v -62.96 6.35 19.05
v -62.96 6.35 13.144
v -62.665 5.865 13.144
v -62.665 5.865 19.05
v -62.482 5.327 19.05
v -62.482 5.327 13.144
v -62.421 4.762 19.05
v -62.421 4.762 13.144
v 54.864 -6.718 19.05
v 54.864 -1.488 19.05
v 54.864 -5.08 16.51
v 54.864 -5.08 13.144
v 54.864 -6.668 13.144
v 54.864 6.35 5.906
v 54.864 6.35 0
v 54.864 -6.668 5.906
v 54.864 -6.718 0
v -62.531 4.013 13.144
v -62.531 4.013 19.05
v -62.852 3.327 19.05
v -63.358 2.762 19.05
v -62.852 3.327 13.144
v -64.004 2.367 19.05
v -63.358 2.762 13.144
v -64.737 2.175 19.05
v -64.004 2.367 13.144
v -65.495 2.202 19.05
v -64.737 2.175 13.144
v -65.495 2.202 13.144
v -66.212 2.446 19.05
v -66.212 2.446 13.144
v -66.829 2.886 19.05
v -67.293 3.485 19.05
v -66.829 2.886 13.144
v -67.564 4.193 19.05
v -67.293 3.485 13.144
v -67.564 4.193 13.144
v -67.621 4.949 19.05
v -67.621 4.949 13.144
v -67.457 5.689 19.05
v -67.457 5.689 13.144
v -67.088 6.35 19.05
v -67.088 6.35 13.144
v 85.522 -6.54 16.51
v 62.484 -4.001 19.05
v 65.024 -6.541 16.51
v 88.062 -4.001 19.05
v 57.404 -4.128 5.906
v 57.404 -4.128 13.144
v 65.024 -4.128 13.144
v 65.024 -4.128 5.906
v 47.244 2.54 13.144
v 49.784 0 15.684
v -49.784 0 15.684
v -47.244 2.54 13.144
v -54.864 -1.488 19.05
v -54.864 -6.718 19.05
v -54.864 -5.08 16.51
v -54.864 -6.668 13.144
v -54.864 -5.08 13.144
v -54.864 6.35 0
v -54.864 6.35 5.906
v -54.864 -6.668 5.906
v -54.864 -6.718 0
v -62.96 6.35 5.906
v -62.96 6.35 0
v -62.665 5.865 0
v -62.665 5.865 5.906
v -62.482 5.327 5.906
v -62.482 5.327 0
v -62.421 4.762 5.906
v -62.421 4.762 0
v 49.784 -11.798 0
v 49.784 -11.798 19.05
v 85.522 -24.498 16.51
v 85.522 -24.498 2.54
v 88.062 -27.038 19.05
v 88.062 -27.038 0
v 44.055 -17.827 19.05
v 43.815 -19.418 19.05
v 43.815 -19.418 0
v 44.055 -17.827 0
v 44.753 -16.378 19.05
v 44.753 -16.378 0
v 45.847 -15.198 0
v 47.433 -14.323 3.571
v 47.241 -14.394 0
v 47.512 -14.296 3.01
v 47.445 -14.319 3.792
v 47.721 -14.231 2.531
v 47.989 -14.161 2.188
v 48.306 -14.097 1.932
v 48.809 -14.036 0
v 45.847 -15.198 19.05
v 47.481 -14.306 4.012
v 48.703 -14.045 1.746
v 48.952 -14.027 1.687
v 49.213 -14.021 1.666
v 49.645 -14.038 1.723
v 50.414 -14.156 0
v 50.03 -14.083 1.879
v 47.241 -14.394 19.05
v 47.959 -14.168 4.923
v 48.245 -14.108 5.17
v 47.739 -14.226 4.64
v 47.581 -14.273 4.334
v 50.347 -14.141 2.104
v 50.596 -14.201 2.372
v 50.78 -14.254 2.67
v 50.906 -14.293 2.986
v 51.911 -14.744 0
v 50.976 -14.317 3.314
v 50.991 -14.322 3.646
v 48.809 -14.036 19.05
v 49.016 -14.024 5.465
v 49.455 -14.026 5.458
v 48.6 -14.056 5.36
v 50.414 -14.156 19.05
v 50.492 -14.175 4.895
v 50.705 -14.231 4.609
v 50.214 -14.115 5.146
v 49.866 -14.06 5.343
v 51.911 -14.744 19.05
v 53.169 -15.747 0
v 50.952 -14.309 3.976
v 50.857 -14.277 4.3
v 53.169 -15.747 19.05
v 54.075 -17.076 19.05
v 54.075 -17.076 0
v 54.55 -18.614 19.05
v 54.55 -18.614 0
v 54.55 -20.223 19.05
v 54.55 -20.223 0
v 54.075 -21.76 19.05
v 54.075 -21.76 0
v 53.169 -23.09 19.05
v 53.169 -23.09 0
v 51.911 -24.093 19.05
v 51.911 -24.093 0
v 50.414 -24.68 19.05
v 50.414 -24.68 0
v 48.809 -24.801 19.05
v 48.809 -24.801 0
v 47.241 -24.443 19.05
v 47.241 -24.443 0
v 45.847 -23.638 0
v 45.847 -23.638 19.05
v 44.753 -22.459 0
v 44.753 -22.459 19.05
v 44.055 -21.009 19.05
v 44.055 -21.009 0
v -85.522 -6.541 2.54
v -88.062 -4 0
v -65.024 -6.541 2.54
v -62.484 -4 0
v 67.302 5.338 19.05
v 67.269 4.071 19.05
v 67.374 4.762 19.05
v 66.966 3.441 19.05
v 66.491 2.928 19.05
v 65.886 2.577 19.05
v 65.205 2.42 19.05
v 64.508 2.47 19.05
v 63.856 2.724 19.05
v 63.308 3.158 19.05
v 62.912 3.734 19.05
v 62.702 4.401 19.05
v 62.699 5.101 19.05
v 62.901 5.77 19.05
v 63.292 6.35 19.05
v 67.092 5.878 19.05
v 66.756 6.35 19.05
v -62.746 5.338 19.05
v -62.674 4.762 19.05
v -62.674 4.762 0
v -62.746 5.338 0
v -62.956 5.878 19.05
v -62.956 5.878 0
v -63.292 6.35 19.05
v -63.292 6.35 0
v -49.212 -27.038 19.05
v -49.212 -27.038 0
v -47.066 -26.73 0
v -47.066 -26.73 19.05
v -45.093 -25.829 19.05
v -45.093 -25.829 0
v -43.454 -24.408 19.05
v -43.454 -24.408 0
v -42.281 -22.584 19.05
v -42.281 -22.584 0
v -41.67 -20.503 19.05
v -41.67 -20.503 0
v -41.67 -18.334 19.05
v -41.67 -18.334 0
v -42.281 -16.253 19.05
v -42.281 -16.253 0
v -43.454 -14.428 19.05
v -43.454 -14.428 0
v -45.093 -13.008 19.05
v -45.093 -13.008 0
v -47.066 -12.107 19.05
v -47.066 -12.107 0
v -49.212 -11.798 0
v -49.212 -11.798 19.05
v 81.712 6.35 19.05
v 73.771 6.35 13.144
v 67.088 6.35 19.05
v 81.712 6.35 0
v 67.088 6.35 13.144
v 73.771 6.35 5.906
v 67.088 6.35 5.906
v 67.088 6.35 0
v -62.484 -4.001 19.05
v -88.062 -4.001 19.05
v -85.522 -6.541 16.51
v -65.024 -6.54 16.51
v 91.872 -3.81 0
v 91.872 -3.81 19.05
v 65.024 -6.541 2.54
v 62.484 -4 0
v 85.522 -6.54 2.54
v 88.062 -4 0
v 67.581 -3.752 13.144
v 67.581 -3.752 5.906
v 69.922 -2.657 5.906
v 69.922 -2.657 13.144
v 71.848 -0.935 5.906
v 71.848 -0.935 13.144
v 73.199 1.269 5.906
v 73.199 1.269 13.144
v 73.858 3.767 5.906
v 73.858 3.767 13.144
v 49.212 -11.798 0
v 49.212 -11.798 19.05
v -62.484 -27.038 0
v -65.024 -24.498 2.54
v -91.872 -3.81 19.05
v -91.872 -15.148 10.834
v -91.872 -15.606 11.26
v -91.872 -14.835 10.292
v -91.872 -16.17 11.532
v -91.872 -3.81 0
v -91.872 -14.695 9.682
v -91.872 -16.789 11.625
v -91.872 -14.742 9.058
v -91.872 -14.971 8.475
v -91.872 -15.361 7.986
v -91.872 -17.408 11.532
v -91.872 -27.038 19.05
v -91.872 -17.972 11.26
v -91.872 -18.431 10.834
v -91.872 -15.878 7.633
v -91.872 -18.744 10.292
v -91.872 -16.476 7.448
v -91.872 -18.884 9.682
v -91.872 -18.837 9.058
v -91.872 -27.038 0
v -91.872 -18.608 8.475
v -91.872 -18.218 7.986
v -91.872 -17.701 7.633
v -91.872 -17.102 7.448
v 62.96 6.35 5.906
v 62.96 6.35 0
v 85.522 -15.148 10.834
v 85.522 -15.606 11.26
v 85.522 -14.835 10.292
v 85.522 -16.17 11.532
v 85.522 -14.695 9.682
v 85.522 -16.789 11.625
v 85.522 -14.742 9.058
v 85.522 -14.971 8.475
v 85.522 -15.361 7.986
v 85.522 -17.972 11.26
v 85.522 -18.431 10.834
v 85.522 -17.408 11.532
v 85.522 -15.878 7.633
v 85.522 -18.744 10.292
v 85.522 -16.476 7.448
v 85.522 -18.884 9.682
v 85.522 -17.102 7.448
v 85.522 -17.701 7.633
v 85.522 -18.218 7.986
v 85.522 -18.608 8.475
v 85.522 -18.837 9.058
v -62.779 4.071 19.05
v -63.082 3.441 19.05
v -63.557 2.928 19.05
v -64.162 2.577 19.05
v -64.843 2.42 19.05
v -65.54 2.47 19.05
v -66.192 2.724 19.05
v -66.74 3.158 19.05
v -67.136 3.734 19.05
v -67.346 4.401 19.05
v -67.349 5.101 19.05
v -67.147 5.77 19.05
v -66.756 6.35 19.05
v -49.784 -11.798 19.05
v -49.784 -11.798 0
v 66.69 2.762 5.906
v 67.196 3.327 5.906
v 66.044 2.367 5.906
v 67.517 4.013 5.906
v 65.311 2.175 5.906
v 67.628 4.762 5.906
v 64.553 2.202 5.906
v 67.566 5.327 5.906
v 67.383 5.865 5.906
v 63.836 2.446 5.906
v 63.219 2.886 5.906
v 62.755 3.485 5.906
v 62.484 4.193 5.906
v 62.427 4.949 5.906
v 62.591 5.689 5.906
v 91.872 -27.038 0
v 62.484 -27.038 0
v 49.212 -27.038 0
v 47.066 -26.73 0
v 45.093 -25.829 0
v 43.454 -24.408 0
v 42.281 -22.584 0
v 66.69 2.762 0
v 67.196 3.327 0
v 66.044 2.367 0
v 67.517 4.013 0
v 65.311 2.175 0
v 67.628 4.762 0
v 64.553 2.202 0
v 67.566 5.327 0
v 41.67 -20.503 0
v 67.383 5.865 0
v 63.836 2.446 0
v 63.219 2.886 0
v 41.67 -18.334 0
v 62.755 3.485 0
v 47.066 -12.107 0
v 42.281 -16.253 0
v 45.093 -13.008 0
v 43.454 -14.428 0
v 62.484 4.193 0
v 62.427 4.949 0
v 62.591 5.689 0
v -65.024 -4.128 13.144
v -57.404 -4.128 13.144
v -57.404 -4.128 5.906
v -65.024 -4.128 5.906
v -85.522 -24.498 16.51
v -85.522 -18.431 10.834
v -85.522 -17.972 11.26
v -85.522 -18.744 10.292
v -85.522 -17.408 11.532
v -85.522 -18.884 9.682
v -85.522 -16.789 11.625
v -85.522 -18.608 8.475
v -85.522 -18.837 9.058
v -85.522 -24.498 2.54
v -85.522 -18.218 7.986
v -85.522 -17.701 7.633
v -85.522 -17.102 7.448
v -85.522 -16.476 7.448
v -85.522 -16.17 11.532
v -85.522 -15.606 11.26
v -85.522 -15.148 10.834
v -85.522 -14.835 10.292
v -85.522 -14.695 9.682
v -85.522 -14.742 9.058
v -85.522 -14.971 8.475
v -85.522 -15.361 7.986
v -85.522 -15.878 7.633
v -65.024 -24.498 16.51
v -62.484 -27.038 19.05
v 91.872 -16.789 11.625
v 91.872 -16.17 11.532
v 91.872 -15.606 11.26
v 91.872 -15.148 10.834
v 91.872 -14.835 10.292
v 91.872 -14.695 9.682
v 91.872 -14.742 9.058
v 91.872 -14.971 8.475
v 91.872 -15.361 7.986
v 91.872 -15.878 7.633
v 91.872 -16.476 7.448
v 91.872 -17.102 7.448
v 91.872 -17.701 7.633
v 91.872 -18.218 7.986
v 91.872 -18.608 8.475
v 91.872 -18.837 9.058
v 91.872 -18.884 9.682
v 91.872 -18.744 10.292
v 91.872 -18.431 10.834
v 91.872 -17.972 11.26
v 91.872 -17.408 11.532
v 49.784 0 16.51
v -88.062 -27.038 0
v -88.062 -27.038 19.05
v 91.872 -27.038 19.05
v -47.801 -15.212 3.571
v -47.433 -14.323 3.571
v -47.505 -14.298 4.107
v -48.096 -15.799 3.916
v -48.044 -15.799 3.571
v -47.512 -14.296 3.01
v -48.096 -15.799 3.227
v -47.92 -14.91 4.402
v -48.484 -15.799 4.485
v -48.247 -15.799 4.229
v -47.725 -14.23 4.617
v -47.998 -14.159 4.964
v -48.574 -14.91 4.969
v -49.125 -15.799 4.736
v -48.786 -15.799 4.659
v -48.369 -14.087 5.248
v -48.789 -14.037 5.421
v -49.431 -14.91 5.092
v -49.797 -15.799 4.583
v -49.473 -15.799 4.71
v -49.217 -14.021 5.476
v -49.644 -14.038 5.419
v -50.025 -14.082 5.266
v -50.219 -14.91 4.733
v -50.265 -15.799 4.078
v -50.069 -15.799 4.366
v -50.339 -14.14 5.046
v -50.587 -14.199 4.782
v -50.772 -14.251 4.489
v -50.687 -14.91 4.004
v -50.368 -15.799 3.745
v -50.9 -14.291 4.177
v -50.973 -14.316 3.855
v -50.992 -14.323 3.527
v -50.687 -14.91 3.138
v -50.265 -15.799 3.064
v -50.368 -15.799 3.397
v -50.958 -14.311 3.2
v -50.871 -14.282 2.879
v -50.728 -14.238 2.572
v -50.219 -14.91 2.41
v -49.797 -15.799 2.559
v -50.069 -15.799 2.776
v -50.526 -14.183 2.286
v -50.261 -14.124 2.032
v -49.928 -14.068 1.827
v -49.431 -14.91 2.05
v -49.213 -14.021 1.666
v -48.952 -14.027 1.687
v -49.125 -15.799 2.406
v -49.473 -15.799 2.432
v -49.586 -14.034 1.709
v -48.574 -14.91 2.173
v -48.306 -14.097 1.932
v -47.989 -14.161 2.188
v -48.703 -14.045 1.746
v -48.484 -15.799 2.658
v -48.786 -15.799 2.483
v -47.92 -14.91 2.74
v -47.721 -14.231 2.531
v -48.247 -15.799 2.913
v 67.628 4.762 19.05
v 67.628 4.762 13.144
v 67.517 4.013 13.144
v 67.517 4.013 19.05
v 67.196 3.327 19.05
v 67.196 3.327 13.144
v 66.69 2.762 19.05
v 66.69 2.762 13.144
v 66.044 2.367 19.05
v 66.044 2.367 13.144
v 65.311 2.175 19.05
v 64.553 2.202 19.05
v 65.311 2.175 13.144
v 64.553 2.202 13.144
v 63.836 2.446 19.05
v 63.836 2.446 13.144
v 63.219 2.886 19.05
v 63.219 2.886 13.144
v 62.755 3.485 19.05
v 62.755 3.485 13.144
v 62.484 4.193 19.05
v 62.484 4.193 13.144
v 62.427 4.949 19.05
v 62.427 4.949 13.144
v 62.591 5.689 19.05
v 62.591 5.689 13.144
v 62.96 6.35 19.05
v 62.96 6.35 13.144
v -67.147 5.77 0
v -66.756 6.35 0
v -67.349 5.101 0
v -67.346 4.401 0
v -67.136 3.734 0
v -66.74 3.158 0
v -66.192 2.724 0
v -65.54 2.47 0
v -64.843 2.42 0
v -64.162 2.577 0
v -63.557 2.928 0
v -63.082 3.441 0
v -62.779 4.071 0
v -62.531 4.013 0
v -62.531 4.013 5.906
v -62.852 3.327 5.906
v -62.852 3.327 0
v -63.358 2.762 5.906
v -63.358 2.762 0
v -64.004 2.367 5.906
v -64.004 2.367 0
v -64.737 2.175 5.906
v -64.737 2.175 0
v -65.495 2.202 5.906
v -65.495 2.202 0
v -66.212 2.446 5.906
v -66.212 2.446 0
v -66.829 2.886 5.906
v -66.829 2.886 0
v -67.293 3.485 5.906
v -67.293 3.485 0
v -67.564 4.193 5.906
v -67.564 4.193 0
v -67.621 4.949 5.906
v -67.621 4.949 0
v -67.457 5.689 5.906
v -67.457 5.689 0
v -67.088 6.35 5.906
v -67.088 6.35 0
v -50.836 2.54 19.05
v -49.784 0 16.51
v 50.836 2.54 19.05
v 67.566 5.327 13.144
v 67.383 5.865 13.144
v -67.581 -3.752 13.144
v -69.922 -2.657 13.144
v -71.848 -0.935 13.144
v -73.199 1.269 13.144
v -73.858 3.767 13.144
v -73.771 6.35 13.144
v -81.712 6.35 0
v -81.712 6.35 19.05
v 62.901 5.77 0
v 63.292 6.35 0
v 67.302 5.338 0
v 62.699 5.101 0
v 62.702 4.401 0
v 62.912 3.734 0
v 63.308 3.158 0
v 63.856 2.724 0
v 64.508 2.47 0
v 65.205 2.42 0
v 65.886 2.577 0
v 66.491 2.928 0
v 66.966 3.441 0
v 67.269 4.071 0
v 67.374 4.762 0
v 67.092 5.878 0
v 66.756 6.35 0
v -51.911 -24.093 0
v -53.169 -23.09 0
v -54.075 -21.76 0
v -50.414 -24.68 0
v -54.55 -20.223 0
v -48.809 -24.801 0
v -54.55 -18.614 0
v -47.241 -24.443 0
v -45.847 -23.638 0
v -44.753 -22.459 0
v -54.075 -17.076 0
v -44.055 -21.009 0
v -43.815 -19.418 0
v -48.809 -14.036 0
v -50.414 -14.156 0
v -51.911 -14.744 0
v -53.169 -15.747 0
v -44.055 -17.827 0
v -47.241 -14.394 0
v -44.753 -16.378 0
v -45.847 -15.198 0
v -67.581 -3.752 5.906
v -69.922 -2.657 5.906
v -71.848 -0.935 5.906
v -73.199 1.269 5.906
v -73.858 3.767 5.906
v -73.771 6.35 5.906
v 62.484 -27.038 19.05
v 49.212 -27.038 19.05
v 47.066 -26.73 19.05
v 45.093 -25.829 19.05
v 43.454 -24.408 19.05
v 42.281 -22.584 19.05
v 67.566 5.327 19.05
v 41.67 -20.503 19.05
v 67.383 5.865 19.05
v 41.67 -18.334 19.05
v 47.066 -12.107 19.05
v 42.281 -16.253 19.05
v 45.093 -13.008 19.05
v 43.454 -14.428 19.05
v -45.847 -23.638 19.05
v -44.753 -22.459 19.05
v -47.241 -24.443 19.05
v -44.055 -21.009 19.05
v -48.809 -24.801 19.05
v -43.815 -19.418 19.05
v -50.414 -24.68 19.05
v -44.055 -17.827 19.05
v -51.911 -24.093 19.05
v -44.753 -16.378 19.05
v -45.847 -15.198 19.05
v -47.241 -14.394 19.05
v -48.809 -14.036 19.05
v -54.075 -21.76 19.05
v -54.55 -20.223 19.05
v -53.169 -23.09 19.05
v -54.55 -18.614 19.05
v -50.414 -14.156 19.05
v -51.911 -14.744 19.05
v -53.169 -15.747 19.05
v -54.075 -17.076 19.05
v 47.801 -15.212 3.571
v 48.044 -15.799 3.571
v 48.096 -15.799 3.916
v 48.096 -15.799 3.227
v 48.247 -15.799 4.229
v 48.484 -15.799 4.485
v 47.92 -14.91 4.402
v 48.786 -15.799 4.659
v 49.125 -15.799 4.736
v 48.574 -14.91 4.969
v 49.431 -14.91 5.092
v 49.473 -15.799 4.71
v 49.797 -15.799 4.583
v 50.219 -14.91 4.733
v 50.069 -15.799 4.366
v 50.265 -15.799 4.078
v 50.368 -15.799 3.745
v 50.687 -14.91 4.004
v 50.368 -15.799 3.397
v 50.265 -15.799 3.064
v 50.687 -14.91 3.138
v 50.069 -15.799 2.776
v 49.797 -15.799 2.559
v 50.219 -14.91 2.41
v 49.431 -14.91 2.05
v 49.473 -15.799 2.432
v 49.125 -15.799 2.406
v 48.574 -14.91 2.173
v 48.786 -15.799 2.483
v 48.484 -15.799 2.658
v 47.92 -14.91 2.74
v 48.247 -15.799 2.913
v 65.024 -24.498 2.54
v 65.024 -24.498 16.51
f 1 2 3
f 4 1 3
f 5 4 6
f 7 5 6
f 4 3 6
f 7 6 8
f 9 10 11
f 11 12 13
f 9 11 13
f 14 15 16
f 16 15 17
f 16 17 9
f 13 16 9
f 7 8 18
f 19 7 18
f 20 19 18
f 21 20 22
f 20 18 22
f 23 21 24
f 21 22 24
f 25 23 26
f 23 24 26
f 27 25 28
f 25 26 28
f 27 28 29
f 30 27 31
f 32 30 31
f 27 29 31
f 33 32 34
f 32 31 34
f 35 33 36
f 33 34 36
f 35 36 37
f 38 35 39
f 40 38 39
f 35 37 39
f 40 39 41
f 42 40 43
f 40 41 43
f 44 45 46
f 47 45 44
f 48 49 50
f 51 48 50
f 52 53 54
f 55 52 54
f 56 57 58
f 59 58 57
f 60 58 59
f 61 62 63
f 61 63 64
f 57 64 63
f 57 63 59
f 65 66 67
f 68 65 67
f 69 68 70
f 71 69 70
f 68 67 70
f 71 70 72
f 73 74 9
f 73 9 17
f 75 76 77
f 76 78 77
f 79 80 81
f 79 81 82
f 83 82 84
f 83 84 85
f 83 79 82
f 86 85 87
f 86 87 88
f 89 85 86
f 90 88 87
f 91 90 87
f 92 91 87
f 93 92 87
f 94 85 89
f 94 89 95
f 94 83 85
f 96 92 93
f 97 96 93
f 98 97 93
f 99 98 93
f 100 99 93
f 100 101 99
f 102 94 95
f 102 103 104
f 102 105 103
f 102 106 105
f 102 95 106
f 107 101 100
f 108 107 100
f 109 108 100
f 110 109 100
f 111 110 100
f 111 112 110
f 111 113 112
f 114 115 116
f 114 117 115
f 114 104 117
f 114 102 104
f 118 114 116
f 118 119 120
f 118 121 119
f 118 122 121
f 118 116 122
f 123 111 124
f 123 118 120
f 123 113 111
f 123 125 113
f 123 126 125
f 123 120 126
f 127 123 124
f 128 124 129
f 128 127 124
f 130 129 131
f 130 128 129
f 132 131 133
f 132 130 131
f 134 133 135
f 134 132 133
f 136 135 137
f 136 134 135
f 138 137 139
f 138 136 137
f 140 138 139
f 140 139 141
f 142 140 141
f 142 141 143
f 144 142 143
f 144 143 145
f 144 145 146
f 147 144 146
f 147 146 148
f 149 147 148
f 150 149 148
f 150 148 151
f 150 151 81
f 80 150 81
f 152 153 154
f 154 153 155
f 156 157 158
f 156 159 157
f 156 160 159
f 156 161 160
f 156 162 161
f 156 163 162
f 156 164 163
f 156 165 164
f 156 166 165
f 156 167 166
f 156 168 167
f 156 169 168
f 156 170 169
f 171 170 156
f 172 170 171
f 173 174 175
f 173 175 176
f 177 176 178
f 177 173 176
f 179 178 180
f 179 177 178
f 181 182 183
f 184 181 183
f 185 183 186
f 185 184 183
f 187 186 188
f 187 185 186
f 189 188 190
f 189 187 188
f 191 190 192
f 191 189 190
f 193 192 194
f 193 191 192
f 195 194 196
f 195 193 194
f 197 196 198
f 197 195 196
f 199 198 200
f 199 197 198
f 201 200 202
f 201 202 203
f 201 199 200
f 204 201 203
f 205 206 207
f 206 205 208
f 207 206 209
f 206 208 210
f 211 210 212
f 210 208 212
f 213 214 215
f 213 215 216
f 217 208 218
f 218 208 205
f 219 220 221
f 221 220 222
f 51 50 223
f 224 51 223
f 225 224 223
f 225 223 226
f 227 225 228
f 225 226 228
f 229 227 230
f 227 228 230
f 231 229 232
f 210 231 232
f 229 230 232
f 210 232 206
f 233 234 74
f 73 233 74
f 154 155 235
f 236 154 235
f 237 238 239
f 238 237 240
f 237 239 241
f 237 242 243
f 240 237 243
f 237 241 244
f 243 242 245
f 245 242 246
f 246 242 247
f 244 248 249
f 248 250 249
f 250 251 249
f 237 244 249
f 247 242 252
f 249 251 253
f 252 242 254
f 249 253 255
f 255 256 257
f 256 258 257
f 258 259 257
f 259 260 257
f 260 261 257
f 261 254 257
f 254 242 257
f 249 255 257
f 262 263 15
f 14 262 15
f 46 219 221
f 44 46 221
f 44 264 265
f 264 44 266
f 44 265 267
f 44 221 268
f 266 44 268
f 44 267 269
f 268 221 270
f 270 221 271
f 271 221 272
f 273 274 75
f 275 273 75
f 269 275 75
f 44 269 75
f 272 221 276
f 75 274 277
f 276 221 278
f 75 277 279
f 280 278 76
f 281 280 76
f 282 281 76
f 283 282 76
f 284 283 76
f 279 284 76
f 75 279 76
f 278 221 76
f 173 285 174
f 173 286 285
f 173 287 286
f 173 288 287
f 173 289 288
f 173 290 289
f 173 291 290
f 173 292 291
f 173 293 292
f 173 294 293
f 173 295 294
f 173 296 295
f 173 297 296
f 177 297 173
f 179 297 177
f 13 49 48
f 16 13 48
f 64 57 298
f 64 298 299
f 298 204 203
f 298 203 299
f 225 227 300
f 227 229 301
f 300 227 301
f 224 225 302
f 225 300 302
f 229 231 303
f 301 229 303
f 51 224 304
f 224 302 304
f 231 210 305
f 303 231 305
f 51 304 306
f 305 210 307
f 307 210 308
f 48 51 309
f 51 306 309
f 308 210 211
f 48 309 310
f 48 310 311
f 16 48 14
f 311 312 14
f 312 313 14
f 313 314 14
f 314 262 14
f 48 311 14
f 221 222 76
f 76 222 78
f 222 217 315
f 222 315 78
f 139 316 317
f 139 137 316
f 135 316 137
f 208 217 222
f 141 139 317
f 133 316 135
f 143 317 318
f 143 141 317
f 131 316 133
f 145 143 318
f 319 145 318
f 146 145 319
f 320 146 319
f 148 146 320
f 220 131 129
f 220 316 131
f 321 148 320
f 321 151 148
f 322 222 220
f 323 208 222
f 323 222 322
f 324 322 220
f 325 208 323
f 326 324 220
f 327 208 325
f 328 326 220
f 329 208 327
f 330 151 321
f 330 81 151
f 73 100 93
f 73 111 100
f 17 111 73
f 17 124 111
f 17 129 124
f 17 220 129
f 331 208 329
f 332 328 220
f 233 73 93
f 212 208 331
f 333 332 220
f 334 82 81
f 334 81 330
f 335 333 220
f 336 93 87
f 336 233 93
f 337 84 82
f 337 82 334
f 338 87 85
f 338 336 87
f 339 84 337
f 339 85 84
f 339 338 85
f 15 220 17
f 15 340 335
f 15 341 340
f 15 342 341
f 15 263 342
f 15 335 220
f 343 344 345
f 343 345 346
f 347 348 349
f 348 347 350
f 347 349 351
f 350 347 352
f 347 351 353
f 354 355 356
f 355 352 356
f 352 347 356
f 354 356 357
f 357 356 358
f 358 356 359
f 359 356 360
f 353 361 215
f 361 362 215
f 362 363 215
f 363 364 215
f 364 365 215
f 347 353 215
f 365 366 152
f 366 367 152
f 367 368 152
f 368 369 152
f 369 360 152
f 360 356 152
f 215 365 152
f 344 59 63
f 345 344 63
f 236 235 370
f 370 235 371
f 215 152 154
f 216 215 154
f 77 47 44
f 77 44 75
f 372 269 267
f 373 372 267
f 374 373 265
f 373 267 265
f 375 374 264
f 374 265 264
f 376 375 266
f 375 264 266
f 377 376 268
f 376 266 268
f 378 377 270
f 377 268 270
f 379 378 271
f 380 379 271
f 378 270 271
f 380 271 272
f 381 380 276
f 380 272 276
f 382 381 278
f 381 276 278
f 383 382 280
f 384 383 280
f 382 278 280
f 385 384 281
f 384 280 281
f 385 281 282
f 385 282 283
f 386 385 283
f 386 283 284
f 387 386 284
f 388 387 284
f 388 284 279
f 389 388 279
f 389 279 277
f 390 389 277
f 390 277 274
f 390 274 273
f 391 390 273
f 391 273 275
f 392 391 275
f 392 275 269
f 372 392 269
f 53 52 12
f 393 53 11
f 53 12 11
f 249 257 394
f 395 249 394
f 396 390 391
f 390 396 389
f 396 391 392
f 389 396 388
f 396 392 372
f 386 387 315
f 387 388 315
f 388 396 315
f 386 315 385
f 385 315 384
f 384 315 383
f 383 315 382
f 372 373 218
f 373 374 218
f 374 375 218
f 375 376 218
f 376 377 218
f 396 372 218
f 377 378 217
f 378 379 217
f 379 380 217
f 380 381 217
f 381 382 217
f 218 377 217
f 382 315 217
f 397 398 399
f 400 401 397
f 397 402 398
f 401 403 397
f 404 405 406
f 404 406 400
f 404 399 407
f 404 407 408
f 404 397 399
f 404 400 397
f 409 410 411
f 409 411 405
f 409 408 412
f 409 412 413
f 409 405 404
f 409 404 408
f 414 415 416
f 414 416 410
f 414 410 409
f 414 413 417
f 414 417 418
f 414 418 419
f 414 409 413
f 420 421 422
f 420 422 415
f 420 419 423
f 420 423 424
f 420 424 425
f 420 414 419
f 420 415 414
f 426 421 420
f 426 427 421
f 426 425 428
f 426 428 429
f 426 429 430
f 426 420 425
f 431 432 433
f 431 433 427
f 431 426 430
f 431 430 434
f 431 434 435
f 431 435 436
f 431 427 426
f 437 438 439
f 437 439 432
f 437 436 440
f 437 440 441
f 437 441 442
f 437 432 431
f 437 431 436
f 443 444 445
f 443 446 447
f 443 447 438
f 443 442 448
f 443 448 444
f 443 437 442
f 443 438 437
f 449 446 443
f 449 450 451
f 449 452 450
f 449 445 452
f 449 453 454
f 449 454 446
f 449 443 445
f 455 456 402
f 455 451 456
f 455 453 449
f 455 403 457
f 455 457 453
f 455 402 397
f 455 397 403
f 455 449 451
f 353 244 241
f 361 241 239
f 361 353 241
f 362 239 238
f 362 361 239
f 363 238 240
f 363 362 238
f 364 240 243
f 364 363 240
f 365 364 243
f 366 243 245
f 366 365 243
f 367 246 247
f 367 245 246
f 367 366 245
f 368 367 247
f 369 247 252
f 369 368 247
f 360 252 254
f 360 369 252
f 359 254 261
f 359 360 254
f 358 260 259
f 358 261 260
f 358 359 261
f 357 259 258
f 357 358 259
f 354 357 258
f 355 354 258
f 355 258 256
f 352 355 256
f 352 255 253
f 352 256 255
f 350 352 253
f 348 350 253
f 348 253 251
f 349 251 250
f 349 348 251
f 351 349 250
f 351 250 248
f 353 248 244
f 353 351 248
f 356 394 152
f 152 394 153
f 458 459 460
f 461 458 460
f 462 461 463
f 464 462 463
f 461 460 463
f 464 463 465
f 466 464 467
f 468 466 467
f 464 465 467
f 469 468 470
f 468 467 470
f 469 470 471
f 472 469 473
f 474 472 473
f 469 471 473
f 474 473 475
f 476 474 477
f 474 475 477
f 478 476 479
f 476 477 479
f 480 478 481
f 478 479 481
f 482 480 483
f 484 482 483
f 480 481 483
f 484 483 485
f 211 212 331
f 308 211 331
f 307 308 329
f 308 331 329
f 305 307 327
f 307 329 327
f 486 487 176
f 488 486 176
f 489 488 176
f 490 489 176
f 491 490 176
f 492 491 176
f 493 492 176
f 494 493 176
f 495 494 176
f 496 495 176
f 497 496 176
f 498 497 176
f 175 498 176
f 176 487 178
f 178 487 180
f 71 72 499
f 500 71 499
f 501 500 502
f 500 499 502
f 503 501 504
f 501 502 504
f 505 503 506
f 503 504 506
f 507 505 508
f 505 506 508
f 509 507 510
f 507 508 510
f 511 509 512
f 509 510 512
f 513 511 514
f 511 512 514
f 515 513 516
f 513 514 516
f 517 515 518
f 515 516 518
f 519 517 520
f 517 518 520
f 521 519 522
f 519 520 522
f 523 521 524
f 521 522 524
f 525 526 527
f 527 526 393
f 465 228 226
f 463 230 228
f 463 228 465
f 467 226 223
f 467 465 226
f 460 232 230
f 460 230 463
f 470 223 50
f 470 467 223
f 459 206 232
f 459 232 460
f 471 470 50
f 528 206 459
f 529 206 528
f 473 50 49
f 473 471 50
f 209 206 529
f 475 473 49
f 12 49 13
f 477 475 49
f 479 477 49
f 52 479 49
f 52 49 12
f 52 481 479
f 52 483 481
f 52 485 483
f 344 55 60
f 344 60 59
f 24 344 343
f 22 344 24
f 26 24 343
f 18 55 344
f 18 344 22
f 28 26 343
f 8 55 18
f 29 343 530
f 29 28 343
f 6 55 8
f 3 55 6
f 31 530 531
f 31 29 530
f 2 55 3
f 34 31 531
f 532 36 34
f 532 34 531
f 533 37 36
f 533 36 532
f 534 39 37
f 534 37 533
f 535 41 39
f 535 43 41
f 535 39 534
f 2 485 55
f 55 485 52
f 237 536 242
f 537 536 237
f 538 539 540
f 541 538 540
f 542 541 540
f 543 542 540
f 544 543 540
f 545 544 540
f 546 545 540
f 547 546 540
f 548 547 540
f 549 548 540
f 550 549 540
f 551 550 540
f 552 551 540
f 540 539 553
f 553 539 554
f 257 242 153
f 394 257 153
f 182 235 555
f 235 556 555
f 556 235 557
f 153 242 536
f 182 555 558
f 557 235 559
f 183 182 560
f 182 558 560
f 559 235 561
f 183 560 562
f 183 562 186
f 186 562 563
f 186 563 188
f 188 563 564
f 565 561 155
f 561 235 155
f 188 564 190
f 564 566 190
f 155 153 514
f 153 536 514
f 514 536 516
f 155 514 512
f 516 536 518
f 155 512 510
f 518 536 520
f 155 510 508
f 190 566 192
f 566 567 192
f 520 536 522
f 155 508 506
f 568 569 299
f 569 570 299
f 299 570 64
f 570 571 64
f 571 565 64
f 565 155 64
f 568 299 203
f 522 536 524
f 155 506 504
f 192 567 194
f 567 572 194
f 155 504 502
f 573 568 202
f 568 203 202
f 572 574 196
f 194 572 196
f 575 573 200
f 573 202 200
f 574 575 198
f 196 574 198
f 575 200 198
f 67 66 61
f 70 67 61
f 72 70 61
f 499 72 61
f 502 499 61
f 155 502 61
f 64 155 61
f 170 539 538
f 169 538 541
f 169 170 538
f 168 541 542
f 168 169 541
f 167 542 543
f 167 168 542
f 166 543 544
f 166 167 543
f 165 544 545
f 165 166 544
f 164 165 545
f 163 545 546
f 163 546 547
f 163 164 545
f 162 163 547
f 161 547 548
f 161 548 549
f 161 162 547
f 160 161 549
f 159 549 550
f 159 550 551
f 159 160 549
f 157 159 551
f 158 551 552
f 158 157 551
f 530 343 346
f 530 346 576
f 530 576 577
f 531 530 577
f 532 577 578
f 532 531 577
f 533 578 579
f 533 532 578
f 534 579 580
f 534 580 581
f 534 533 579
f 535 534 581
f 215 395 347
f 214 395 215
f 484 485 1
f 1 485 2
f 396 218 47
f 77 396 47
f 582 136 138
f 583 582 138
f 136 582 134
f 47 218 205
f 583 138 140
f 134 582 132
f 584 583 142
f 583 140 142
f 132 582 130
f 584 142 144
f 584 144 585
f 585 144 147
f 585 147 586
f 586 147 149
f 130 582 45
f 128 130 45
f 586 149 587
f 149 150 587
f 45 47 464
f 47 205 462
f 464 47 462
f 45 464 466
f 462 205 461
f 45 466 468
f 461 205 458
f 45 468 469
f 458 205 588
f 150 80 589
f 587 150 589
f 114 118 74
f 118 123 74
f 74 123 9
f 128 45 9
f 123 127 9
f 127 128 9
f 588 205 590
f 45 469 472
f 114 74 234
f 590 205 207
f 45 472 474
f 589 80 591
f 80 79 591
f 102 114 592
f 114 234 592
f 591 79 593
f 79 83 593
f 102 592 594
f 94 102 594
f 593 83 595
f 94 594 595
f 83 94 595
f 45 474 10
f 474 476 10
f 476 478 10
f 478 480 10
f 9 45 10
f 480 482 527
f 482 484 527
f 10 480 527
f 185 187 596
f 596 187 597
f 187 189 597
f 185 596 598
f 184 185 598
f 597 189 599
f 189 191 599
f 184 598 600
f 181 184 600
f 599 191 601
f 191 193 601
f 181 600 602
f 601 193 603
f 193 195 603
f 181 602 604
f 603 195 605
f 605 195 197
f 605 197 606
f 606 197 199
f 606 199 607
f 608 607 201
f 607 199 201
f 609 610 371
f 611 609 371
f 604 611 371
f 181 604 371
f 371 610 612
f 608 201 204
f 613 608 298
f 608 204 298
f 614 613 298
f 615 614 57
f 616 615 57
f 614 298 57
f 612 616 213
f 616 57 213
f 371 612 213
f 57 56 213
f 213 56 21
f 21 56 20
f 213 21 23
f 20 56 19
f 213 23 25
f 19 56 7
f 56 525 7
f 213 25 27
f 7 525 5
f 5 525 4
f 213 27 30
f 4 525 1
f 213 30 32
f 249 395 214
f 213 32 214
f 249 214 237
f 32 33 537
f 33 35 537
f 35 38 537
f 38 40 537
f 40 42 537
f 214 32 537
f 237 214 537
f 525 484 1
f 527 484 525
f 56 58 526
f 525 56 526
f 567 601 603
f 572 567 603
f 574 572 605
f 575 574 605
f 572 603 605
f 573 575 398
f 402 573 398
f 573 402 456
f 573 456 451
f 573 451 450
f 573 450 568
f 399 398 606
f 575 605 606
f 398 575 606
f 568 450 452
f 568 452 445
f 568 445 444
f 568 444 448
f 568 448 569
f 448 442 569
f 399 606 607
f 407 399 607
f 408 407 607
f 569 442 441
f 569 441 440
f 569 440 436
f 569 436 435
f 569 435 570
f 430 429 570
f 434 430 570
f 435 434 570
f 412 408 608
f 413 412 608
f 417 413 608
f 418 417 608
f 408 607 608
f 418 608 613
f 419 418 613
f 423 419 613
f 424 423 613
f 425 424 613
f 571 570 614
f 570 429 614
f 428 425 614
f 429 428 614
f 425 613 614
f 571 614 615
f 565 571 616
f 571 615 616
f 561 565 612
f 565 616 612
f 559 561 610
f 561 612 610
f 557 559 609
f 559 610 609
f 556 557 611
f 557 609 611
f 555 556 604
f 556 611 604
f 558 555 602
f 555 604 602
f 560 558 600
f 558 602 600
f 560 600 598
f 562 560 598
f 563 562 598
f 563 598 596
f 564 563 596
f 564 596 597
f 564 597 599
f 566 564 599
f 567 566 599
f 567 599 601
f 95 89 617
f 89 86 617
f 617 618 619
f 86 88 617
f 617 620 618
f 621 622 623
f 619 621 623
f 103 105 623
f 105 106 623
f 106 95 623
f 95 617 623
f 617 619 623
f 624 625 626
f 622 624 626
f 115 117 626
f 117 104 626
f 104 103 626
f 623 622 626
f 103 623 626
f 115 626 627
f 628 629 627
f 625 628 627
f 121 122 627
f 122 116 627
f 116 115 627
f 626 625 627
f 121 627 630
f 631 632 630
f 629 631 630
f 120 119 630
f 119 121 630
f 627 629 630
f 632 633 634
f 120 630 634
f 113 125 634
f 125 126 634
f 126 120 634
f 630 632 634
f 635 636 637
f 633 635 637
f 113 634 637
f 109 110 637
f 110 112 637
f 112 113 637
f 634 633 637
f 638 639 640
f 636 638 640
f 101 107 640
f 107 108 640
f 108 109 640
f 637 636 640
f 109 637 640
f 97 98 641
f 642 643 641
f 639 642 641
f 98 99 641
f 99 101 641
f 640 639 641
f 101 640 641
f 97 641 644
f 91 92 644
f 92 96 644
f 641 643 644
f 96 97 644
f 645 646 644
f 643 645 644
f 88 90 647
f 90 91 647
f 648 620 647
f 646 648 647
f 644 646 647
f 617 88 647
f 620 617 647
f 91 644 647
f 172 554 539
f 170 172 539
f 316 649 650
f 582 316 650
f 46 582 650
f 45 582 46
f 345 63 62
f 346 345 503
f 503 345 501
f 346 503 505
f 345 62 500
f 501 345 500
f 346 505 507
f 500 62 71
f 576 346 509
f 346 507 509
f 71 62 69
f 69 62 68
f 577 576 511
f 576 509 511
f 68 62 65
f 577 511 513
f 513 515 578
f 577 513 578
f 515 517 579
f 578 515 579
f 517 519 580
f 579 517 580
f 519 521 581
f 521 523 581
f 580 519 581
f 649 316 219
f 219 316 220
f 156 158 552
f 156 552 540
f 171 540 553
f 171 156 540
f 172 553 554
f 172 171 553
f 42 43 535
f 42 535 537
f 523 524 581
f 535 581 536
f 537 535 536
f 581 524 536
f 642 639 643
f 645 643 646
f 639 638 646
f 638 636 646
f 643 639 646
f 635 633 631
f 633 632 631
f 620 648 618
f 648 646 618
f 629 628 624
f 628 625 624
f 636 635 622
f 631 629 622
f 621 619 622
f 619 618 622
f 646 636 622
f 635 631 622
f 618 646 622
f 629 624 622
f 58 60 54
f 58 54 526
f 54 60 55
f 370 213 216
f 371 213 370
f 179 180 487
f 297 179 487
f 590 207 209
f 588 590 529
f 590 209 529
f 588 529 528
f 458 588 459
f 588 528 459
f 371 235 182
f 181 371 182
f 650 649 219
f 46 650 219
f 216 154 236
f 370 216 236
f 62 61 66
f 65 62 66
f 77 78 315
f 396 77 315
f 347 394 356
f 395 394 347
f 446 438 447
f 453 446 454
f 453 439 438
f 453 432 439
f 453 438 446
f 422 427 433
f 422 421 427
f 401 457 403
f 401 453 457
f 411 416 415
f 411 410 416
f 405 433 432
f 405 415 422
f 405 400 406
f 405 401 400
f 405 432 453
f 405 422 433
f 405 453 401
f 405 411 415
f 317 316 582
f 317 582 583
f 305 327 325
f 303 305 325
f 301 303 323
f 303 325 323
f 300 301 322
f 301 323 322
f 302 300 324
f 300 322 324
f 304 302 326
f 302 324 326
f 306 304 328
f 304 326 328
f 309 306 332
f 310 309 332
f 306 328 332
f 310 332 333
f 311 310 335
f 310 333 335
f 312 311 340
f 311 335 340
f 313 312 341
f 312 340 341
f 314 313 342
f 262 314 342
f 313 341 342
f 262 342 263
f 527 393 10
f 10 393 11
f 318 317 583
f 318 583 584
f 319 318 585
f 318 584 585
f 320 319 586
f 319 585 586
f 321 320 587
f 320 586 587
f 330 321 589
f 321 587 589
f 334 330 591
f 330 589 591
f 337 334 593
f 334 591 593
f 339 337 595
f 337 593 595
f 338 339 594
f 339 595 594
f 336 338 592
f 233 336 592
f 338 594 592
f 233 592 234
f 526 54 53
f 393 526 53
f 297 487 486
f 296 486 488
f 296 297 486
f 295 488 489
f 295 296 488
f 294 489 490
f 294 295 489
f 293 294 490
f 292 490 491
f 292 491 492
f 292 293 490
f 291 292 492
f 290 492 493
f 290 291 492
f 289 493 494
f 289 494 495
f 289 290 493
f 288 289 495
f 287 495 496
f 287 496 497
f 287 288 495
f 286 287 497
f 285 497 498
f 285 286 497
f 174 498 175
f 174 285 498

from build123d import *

# Parameters (mm, degrees)
BOSS_EXTRUDE1_DEPTH       = 19.05
M5X0_8_TAPPED_HOLE1_D     = 4.2
M5X0_8_TAPPED_HOLE1_DEPTH = 6.35
SKETCH2_R                 = 8.89
CUT_EXTRUDE1_DEPTH        = 3.6195
BOSS_EXTRUDE2_DEPTH       = 19.05
BOSS_EXTRUDE2_2_DEPTH     = 19.05
CHAMFER1_SIZE             = 2.54
CHAMFER2_SIZE             = 10.16
CHAMFER1_OF_MIRROR1_SIZE  = 2.54
CHAMFER2_OF_MIRROR1_SIZE  = 10.16
SKETCH4_W                 = 109.728
SKETCH4_H                 = 13.1445
CUT_EXTRUDE2_DEPTH        = 34.3883
CHAMFER3_SIZE             = 2.54
CHAMFER6_SIZE             = 5.08
SKETCH5_R                 = 5.3975
BOSS_EXTRUDE3_DEPTH       = 19.05
SKETCH6_R                 = 1.905
BOSS_EXTRUDE4_DEPTH       = 1.778
BOSS_EXTRUDE4_TAPER       = 22.5
CHAMFER7_SIZE             = 5.08
CHAMFER4_SIZE             = 2.54
CHAMFER5_SIZE             = 2.54


with BuildPart() as part:
    # Sketch1 → Boss-Extrude1 (new body)
    with BuildSketch(Plane.XY):
        with BuildLine():
            Line((-54.864, -27.0383), (-54.864, 0))
            Line((-54.864, 0), (54.864, 0))
            Line((54.864, 0), (54.864, -27.0383))
            Line((54.864, -27.0383), (65.024, -27.0383))
            Line((65.024, -27.0383), (65.024, -6.5405))
            Line((65.024, -6.5405), (85.5218, -6.5405))
            Line((85.5218, -6.5405), (85.5218, -27.0383))
            Line((85.5218, -27.0383), (91.8718, -27.0383))
            Line((91.8718, -27.0383), (91.8718, 6.35))
            Line((91.8718, 6.35), (67.087505755, 6.35))
            ThreePointArc((67.087505755, 6.35), (67.488807242, 5.600913686), (67.6275, 4.7625))
            ThreePointArc((67.6275, 4.7625), (64.185586314, 2.297692758), (62.960494245, 6.35))
            Line((62.960494245, 6.35), (-62.960494245, 6.35))
            ThreePointArc((-62.960494245, 6.35), (-62.559192758, 5.600913686), (-62.4205, 4.7625))
            ThreePointArc((-62.4205, 4.7625), (-65.862413686, 2.297692758), (-67.087505755, 6.35))
            Line((-67.087505755, 6.35), (-91.8718, 6.35))
            Line((-91.8718, 6.35), (-91.8718, -27.0383))
            Line((-91.8718, -27.0383), (-85.5218, -27.0383))
            Line((-85.5218, -27.0383), (-85.5218, -6.5405))
            Line((-85.5218, -6.5405), (-65.024, -6.5405))
            Line((-65.024, -6.5405), (-65.024, -27.0383))
            Line((-65.024, -27.0383), (-54.864, -27.0383))
        make_face()
    extrude(amount=BOSS_EXTRUDE1_DEPTH)

    # M5x0.8 Tapped Hole1
    with Locations(Plane(origin=(91.8718, 0, 0), x_dir=(0, 0, -1), z_dir=(1, 0, 0))):
        with Locations((-9.525, -16.7894)):
            m5x0_8_tapped_hole1 = Hole(M5X0_8_TAPPED_HOLE1_D / 2, depth=M5X0_8_TAPPED_HOLE1_DEPTH)

    # Sketch2 → Cut-Extrude1 (cut, symmetric)
    with BuildSketch(Plane.XY.offset(9.525)):
        Polygon((0, 13.6525), (56.134, 13.6525), (56.134, 4.7625), (56.134, -4.1275), (0, -4.1275), align=None)
        with BuildLine():
            Line((56.134, 13.6525), (56.134, 4.7625))
            ThreePointArc((56.134, 4.7625), (58.737820715, 11.048679285), (65.024, 13.6525))
            Line((65.024, 13.6525), (56.134, 13.6525))
        make_face()
        with Locations((65.024, 4.7625)):
            Circle(SKETCH2_R)
        with BuildLine():
            Line((56.134, -4.1275), (65.024, -4.1275))
            ThreePointArc((65.024, -4.1275), (58.737820715, -1.523679285), (56.134, 4.7625))
            Line((56.134, 4.7625), (56.134, -4.1275))
        make_face()
    cut_extrude1 = extrude(amount=CUT_EXTRUDE1_DEPTH, both=True, mode=Mode.SUBTRACT)

    # Chamfer1
    chamfer1_edges = [part.edges().sort_by_distance(p)[0] for p in [
        (85.5218, -27.0383, 9.525),
        (65.024, -27.0383, 9.525),
    ]]
    chamfer(chamfer1_edges, length=CHAMFER1_SIZE)

    # Chamfer2
    chamfer2_edges = [part.edges().sort_by_distance(p)[0] for p in [
        (91.8718, 6.35, 9.525),
    ]]
    chamfer(chamfer2_edges, length=CHAMFER2_SIZE)

    # Mirror1: M5x0.8 Tapped Hole1, Cut-Extrude1 across plane
    add(m5x0_8_tapped_hole1.mirror(Plane(origin=(0, 0, 0), x_dir=(0, 0, 1), z_dir=(1, 0, 0))), mode=Mode.SUBTRACT)
    add(cut_extrude1.mirror(Plane(origin=(0, 0, 0), x_dir=(0, 0, 1), z_dir=(1, 0, 0))), mode=Mode.SUBTRACT)

    # Chamfer1 of Mirror1
    chamfer1_of_mirror1_edges = [part.edges().sort_by_distance(p)[0] for p in [
        (-85.5218, -27.0383, 9.525),
        (-65.024, -27.0383, 9.525),
    ]]
    chamfer(chamfer1_of_mirror1_edges, length=CHAMFER1_OF_MIRROR1_SIZE)

    # Chamfer2 of Mirror1
    chamfer2_of_mirror1_edges = [part.edges().sort_by_distance(p)[0] for p in [
        (-91.8718, 6.35, 9.525),
    ]]
    chamfer(chamfer2_of_mirror1_edges, length=CHAMFER2_OF_MIRROR1_SIZE)

    # Sketch4 → Cut-Extrude2 (cut, through all)
    with BuildSketch(Plane(origin=(0, 6.35, 0), x_dir=(1, 0, 0), z_dir=(0, 1, 0))):
        with Locations((0, -6.57225)):
            Rectangle(SKETCH4_W, SKETCH4_H)
    extrude(amount=-CUT_EXTRUDE2_DEPTH, mode=Mode.SUBTRACT)

    # Chamfer3
    chamfer3_edges = [part.edges().sort_by_distance(p)[0] for p in [
        (-54.864, -4.1275, 9.525),
        (54.864, -4.1275, 9.525),
    ]]
    chamfer(chamfer3_edges, length=CHAMFER3_SIZE)

    # Chamfer6
    chamfer6_edges = [part.edges().sort_by_distance(p)[0] for p in [
        (54.864, 0, 16.09725),
        (-54.864, 0, 16.09725),
    ]]
    chamfer(chamfer6_edges, length=CHAMFER6_SIZE)

    # Sketch5 → Boss-Extrude3 (add)
    with BuildSketch(Plane.XY.offset(19.05)):
        with BuildLine():
            Line((-54.864, -27.0383), (-49.2125, -27.0383))
            ThreePointArc((-49.2125, -27.0383), (-41.5925, -19.4183), (-49.2125, -11.7983))
            Line((-49.2125, -11.7983), (-54.864, -11.7983))
            Line((-54.864, -11.7983), (-54.864, -27.0383))
        make_face()
        with Locations((-49.2125, -19.4183)):
            Circle(SKETCH5_R, mode=Mode.SUBTRACT)
    boss_extrude3 = extrude(amount=-BOSS_EXTRUDE3_DEPTH)

    # Sketch6 → Boss-Extrude4 (add)
    with BuildSketch(Plane.XZ.offset(14.0208)):
        with Locations((-49.2125, 3.57123405)):
            Circle(SKETCH6_R)
    boss_extrude4 = extrude(amount=BOSS_EXTRUDE4_DEPTH, taper=BOSS_EXTRUDE4_TAPER)

    # Mirror5: Boss-Extrude3, Boss-Extrude4 across plane
    add(boss_extrude3.mirror(Plane(origin=(0, 0, 0), x_dir=(0, 0, 1), z_dir=(1, 0, 0))))
    add(boss_extrude4.mirror(Plane(origin=(0, 0, 0), x_dir=(0, 0, 1), z_dir=(1, 0, 0))))

    # Chamfer7
    chamfer7_edges = [part.edges().sort_by_distance(p)[0] for p in [
        (-54.864, -11.7983, 9.525),
        (54.864, -11.7983, 9.525),
    ]]
    chamfer(chamfer7_edges, length=CHAMFER7_SIZE)

    # Chamfer4
    chamfer4_edges = [part.edges().sort_by_distance(p)[0] for p in [
        (0, 0, 13.1445),
        (0, 0, 19.05),
        (-52.324, -2.54, 19.05),
        (52.324, -2.54, 19.05),
    ]]
    chamfer(chamfer4_edges, length=CHAMFER4_SIZE)

    # Chamfer5
    chamfer5_edges = [part.edges().sort_by_distance(p)[0] for p in [
        (-85.5218, -15.5194, 0),
        (-75.2729, -6.5405, 0),
        (-65.024, -15.5194, 0),
        (-65.024, -15.5194, 19.05),
        (-75.2729, -6.5405, 19.05),
        (-85.5218, -15.5194, 19.05),
        (85.5218, -15.5194, 0),
        (85.5218, -15.5194, 19.05),
        (75.2729, -6.5405, 0),
        (75.2729, -6.5405, 19.05),
        (65.024, -15.5194, 19.05),
        (65.024, -15.5194, 0),
    ]]
    chamfer(chamfer5_edges, length=CHAMFER5_SIZE)


with BuildPart() as body_2:
    # Sketch3 → Boss-Extrude2 (new body)
    with BuildSketch(Plane.XY.offset(19.05)):
        with BuildLine():
            Line((66.756049076, 6.35), (63.291950924, 6.35))
            ThreePointArc((63.291950924, 6.35), (64.172324901, 2.572796875), (67.3735, 4.7625))
            ThreePointArc((67.3735, 4.7625), (67.213703125, 5.614175099), (66.756049076, 6.35))
        make_face()
    boss_extrude2 = extrude(amount=-BOSS_EXTRUDE2_DEPTH)


with BuildPart() as body_3:
    # Sketch3 → Boss-Extrude2 2 (new body)
    with BuildSketch(Plane.XY.offset(19.05)):
        with BuildLine():
            ThreePointArc((-62.6745, 4.7625), (-62.834296875, 5.614175099), (-63.291950924, 6.35))
            Line((-63.291950924, 6.35), (-66.756049076, 6.35))
            ThreePointArc((-66.756049076, 6.35), (-65.875675099, 2.572796875), (-62.6745, 4.7625))
        make_face()
    boss_extrude2_2 = extrude(amount=-BOSS_EXTRUDE2_2_DEPTH)


with BuildPart() as body_2_1:
    add(body_2.part)

    add(body_3.part)  # Mirror1 2 merges body 3
    # Mirror1 2: Boss-Extrude2, Boss-Extrude2 2 across plane
    add(boss_extrude2.mirror(Plane(origin=(0, 0, 0), x_dir=(0, 0, 1), z_dir=(1, 0, 0))))
    add(boss_extrude2_2.mirror(Plane(origin=(0, 0, 0), x_dir=(0, 0, 1), z_dir=(1, 0, 0))))


solid = Compound([part.part, body_2_1.part])
